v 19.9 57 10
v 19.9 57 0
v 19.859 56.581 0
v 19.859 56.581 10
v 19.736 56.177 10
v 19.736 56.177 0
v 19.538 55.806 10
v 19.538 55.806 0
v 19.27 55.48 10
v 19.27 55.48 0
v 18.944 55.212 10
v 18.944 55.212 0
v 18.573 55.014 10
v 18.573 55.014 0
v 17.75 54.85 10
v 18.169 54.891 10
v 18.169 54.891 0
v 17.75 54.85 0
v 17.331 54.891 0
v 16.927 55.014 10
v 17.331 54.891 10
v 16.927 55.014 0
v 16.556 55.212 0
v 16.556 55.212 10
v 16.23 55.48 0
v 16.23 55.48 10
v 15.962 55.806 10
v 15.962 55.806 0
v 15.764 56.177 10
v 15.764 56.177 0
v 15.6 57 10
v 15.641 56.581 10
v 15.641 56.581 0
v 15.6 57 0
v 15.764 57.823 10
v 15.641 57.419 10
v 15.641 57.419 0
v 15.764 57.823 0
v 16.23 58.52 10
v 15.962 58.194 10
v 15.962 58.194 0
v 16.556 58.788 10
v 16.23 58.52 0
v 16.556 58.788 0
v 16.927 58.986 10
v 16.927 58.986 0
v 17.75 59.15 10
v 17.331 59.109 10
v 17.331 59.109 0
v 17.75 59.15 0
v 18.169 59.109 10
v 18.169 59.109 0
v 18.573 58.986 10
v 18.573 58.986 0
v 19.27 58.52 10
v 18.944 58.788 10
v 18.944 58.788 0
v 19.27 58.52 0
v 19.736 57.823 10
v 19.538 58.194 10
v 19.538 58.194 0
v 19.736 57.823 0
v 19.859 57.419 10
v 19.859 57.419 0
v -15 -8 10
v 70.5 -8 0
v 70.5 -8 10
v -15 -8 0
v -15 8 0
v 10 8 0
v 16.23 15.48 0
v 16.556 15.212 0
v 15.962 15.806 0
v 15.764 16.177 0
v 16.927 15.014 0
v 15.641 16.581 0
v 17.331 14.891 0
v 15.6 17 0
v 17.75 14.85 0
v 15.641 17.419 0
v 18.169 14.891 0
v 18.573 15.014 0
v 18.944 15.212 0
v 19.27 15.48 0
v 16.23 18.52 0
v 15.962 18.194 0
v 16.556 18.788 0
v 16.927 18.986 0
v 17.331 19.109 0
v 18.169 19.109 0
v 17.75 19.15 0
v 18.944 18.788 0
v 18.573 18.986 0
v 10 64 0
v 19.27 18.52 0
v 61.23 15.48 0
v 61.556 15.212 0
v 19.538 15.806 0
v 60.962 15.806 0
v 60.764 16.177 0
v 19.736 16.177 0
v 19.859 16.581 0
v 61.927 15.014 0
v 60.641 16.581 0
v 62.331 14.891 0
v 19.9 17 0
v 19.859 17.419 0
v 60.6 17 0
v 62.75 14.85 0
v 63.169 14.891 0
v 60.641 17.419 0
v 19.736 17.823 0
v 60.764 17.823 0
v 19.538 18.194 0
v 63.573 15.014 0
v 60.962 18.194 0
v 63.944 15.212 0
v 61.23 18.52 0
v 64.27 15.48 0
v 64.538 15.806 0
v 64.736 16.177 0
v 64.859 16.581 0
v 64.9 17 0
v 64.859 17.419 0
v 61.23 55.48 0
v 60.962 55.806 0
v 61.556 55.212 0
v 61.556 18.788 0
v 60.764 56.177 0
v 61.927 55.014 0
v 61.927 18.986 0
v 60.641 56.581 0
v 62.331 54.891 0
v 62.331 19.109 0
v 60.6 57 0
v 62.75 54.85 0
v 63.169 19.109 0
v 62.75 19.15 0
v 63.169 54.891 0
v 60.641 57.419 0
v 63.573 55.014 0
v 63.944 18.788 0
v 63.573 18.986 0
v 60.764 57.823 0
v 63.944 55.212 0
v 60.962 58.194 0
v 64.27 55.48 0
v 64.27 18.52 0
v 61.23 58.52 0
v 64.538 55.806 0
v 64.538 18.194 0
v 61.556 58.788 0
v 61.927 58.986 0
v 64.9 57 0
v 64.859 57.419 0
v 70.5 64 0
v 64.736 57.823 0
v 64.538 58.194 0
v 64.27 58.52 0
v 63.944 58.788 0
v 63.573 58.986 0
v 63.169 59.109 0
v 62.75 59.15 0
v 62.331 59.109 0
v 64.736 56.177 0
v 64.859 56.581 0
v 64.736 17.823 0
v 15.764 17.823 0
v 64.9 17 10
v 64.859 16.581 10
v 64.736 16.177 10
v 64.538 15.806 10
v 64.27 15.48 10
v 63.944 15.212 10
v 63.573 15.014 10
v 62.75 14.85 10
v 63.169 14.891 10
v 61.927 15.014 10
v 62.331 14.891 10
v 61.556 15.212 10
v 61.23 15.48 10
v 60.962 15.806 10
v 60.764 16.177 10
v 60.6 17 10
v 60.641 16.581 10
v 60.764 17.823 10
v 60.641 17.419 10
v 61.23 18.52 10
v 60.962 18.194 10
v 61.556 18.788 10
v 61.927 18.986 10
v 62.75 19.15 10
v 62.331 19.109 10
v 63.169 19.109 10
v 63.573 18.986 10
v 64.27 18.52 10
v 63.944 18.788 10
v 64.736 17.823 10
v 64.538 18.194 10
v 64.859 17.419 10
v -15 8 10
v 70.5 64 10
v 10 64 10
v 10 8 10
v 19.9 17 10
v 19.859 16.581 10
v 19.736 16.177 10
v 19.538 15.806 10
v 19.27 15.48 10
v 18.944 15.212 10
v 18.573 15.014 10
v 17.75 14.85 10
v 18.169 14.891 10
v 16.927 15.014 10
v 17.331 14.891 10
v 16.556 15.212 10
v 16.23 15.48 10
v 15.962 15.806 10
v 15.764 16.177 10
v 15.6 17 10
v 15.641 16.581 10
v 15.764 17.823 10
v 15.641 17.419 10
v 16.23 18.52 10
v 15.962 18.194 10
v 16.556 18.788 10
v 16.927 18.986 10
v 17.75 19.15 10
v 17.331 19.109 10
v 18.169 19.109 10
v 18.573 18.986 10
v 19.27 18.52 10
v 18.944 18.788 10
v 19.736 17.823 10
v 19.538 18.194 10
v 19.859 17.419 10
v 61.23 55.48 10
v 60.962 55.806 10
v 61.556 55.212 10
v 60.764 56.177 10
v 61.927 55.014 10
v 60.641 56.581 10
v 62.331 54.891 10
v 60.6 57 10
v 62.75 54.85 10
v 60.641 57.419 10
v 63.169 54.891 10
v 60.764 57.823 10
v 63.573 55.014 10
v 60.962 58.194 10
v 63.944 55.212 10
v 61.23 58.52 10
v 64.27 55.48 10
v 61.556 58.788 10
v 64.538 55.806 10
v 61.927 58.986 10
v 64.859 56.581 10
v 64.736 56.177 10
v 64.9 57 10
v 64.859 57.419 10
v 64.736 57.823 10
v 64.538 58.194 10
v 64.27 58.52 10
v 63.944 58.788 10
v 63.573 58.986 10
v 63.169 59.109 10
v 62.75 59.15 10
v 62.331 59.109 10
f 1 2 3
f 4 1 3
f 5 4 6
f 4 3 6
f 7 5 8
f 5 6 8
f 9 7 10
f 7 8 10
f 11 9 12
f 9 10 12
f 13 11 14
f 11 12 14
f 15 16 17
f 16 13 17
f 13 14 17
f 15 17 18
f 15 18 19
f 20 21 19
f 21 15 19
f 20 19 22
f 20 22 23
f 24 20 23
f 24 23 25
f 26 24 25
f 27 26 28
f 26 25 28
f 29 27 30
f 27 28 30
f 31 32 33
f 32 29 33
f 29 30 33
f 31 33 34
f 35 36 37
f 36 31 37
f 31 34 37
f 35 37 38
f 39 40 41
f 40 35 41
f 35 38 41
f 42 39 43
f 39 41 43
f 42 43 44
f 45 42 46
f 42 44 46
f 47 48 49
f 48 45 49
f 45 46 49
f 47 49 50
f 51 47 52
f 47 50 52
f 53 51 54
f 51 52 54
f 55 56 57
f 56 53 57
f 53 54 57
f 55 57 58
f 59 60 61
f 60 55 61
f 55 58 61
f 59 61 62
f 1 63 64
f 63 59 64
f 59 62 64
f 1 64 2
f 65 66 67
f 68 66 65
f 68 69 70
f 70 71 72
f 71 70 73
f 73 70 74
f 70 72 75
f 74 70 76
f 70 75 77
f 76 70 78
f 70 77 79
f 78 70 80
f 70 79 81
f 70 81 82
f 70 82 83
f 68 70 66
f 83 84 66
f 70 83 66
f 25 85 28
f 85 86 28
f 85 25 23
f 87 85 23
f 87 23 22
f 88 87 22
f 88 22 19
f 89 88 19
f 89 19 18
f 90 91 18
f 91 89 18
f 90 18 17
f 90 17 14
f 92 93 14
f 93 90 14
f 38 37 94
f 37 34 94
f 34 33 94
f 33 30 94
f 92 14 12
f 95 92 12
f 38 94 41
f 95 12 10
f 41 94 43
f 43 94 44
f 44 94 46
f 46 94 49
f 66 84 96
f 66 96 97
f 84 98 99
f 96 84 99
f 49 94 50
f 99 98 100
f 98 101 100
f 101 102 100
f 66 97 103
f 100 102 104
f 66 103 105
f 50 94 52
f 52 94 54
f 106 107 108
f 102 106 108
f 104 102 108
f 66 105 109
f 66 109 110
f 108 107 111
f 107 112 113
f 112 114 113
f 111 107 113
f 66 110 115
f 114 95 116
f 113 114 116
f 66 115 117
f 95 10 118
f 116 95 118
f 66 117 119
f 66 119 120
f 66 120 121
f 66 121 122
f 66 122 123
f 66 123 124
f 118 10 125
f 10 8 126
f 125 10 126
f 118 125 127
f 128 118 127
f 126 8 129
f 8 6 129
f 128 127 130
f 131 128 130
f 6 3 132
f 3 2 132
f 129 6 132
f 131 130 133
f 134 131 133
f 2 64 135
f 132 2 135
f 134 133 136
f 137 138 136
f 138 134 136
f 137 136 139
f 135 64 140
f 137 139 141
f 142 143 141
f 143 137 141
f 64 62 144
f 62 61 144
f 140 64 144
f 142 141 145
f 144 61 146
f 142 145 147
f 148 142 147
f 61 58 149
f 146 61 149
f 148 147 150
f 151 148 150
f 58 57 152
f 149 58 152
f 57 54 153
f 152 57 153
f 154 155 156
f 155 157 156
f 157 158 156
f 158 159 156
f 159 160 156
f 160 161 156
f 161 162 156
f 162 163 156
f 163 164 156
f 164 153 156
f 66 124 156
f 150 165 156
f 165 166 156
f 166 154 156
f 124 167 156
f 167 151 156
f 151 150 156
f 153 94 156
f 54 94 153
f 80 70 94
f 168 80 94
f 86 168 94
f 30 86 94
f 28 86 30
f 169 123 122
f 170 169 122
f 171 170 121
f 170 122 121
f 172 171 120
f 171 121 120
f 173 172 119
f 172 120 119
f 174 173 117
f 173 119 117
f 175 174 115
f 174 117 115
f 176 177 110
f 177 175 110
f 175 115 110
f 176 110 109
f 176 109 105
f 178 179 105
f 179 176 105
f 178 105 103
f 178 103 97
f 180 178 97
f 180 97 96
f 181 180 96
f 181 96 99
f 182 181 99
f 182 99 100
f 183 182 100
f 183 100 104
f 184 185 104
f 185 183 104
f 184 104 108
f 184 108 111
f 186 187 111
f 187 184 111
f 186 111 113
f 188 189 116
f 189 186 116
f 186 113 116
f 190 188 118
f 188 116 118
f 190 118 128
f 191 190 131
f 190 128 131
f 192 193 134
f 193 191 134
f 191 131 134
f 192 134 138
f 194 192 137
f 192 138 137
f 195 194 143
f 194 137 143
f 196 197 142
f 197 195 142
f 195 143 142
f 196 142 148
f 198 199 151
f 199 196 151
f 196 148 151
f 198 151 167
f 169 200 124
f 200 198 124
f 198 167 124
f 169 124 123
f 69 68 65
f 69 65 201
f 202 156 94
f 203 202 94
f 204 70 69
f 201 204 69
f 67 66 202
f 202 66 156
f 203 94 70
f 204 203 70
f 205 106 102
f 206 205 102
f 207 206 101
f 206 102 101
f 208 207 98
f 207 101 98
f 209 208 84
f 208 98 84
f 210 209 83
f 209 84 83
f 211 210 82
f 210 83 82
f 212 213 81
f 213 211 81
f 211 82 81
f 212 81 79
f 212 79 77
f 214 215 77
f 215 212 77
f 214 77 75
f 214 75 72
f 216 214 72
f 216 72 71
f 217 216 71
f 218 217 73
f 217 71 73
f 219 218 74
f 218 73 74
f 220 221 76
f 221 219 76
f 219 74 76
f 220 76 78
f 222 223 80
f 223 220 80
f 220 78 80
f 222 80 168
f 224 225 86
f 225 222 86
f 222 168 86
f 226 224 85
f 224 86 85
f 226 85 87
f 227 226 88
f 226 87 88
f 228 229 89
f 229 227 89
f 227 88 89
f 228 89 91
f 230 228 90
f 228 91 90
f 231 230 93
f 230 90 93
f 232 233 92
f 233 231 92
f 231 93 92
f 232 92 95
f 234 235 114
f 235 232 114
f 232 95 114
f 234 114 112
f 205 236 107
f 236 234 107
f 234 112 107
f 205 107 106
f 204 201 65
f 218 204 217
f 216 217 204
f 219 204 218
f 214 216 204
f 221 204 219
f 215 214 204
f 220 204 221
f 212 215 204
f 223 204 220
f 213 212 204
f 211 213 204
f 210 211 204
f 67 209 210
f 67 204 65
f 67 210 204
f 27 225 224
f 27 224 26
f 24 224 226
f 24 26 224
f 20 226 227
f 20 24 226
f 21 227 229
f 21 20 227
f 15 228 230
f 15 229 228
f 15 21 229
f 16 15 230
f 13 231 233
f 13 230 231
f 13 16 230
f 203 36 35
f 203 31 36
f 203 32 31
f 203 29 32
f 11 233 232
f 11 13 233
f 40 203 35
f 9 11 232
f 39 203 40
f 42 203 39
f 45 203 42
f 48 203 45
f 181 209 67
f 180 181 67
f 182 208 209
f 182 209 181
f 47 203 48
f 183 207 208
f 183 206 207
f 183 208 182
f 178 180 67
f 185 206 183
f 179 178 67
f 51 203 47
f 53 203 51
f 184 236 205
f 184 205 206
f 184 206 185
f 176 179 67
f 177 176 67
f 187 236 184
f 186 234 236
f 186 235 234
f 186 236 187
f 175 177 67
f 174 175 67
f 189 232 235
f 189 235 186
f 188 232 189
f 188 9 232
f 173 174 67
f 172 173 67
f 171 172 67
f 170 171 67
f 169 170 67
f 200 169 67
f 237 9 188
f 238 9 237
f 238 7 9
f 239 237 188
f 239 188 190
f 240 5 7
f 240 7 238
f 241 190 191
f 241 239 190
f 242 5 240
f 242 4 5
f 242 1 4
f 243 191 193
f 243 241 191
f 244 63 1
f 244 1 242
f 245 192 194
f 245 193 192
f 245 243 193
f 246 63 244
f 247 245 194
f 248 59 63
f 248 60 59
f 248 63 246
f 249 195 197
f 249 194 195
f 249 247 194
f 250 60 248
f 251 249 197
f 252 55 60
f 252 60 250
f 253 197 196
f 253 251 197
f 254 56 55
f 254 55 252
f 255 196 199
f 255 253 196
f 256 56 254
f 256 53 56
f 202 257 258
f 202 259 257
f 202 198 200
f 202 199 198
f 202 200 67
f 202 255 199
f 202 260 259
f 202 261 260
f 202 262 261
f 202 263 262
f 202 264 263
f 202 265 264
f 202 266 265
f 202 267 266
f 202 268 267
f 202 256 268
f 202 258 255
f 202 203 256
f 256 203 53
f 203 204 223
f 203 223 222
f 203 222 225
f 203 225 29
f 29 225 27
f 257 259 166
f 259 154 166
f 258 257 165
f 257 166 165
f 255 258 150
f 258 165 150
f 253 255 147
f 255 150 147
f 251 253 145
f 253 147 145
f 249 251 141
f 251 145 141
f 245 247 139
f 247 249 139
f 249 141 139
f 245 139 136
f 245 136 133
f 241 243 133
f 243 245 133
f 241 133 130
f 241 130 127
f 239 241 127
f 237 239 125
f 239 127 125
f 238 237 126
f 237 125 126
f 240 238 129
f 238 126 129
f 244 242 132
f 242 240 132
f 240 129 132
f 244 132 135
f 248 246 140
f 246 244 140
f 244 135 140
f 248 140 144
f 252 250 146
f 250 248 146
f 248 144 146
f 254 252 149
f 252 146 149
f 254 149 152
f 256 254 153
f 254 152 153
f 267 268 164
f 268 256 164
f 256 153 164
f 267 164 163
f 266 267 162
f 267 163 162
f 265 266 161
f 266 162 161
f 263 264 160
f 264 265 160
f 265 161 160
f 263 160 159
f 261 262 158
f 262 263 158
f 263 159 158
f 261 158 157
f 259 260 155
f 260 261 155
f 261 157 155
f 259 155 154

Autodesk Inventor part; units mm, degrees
ref_plane "YZ Plane" through (0, 0, 0) normal (1, 0, 0) x (0, 1, 0)
ref_plane "XZ Plane" through (0, 0, 0) normal (0, 1, 0) x (-1, 0, 0)
ref_plane "XY Plane" through (0, 0, 0) normal (0, 0, 1) x (1, 0, 0)
sketch "Skizze1" plane through (0, 0, 0) normal (0, 0, 1) x (1, 0, 0)
  circle A0 centre (17.75, 57) radius 2.15 projected
  circle A1 centre (62.75, 57) radius 2.15 projected
  circle A2 centre (17.75, 17) radius 2.15 projected
  circle A3 centre (62.75, 17) radius 2.15 projected
  line L0 (70.5, 64) -> (10, 64) projected
  line L1 (10, 64) -> (10, -3) projected
  line L2 (70.5, -3) -> (70.5, 64) projected
  line L3 (10, -3) -> (70.5, -3) projected
  line L4 (0, 0) -> (0, 8) projected
  line L5 (0, 8) -> (-15, 8) projected
  line L6 (-15, -8) -> (-15, 8) projected
  line L7 (0, -8) -> (-15, -8) projected
  line L8 (70.5, -8) -> (70.5, 64)
  line L9 (10, 64) -> (10, 8)
  line L10 (-15, 8) -> (10, 8)
  line L11 (70.5, -8) -> (-15, -8)
  line L12 (-15, 8) -> (-15, -8)
  point P0 (-10, 0)
  dimension "d0" = 16
extrude "Extrusion1" add sketch "Skizze1" along normal blind 10
properties part number "Seiten_Platte"
